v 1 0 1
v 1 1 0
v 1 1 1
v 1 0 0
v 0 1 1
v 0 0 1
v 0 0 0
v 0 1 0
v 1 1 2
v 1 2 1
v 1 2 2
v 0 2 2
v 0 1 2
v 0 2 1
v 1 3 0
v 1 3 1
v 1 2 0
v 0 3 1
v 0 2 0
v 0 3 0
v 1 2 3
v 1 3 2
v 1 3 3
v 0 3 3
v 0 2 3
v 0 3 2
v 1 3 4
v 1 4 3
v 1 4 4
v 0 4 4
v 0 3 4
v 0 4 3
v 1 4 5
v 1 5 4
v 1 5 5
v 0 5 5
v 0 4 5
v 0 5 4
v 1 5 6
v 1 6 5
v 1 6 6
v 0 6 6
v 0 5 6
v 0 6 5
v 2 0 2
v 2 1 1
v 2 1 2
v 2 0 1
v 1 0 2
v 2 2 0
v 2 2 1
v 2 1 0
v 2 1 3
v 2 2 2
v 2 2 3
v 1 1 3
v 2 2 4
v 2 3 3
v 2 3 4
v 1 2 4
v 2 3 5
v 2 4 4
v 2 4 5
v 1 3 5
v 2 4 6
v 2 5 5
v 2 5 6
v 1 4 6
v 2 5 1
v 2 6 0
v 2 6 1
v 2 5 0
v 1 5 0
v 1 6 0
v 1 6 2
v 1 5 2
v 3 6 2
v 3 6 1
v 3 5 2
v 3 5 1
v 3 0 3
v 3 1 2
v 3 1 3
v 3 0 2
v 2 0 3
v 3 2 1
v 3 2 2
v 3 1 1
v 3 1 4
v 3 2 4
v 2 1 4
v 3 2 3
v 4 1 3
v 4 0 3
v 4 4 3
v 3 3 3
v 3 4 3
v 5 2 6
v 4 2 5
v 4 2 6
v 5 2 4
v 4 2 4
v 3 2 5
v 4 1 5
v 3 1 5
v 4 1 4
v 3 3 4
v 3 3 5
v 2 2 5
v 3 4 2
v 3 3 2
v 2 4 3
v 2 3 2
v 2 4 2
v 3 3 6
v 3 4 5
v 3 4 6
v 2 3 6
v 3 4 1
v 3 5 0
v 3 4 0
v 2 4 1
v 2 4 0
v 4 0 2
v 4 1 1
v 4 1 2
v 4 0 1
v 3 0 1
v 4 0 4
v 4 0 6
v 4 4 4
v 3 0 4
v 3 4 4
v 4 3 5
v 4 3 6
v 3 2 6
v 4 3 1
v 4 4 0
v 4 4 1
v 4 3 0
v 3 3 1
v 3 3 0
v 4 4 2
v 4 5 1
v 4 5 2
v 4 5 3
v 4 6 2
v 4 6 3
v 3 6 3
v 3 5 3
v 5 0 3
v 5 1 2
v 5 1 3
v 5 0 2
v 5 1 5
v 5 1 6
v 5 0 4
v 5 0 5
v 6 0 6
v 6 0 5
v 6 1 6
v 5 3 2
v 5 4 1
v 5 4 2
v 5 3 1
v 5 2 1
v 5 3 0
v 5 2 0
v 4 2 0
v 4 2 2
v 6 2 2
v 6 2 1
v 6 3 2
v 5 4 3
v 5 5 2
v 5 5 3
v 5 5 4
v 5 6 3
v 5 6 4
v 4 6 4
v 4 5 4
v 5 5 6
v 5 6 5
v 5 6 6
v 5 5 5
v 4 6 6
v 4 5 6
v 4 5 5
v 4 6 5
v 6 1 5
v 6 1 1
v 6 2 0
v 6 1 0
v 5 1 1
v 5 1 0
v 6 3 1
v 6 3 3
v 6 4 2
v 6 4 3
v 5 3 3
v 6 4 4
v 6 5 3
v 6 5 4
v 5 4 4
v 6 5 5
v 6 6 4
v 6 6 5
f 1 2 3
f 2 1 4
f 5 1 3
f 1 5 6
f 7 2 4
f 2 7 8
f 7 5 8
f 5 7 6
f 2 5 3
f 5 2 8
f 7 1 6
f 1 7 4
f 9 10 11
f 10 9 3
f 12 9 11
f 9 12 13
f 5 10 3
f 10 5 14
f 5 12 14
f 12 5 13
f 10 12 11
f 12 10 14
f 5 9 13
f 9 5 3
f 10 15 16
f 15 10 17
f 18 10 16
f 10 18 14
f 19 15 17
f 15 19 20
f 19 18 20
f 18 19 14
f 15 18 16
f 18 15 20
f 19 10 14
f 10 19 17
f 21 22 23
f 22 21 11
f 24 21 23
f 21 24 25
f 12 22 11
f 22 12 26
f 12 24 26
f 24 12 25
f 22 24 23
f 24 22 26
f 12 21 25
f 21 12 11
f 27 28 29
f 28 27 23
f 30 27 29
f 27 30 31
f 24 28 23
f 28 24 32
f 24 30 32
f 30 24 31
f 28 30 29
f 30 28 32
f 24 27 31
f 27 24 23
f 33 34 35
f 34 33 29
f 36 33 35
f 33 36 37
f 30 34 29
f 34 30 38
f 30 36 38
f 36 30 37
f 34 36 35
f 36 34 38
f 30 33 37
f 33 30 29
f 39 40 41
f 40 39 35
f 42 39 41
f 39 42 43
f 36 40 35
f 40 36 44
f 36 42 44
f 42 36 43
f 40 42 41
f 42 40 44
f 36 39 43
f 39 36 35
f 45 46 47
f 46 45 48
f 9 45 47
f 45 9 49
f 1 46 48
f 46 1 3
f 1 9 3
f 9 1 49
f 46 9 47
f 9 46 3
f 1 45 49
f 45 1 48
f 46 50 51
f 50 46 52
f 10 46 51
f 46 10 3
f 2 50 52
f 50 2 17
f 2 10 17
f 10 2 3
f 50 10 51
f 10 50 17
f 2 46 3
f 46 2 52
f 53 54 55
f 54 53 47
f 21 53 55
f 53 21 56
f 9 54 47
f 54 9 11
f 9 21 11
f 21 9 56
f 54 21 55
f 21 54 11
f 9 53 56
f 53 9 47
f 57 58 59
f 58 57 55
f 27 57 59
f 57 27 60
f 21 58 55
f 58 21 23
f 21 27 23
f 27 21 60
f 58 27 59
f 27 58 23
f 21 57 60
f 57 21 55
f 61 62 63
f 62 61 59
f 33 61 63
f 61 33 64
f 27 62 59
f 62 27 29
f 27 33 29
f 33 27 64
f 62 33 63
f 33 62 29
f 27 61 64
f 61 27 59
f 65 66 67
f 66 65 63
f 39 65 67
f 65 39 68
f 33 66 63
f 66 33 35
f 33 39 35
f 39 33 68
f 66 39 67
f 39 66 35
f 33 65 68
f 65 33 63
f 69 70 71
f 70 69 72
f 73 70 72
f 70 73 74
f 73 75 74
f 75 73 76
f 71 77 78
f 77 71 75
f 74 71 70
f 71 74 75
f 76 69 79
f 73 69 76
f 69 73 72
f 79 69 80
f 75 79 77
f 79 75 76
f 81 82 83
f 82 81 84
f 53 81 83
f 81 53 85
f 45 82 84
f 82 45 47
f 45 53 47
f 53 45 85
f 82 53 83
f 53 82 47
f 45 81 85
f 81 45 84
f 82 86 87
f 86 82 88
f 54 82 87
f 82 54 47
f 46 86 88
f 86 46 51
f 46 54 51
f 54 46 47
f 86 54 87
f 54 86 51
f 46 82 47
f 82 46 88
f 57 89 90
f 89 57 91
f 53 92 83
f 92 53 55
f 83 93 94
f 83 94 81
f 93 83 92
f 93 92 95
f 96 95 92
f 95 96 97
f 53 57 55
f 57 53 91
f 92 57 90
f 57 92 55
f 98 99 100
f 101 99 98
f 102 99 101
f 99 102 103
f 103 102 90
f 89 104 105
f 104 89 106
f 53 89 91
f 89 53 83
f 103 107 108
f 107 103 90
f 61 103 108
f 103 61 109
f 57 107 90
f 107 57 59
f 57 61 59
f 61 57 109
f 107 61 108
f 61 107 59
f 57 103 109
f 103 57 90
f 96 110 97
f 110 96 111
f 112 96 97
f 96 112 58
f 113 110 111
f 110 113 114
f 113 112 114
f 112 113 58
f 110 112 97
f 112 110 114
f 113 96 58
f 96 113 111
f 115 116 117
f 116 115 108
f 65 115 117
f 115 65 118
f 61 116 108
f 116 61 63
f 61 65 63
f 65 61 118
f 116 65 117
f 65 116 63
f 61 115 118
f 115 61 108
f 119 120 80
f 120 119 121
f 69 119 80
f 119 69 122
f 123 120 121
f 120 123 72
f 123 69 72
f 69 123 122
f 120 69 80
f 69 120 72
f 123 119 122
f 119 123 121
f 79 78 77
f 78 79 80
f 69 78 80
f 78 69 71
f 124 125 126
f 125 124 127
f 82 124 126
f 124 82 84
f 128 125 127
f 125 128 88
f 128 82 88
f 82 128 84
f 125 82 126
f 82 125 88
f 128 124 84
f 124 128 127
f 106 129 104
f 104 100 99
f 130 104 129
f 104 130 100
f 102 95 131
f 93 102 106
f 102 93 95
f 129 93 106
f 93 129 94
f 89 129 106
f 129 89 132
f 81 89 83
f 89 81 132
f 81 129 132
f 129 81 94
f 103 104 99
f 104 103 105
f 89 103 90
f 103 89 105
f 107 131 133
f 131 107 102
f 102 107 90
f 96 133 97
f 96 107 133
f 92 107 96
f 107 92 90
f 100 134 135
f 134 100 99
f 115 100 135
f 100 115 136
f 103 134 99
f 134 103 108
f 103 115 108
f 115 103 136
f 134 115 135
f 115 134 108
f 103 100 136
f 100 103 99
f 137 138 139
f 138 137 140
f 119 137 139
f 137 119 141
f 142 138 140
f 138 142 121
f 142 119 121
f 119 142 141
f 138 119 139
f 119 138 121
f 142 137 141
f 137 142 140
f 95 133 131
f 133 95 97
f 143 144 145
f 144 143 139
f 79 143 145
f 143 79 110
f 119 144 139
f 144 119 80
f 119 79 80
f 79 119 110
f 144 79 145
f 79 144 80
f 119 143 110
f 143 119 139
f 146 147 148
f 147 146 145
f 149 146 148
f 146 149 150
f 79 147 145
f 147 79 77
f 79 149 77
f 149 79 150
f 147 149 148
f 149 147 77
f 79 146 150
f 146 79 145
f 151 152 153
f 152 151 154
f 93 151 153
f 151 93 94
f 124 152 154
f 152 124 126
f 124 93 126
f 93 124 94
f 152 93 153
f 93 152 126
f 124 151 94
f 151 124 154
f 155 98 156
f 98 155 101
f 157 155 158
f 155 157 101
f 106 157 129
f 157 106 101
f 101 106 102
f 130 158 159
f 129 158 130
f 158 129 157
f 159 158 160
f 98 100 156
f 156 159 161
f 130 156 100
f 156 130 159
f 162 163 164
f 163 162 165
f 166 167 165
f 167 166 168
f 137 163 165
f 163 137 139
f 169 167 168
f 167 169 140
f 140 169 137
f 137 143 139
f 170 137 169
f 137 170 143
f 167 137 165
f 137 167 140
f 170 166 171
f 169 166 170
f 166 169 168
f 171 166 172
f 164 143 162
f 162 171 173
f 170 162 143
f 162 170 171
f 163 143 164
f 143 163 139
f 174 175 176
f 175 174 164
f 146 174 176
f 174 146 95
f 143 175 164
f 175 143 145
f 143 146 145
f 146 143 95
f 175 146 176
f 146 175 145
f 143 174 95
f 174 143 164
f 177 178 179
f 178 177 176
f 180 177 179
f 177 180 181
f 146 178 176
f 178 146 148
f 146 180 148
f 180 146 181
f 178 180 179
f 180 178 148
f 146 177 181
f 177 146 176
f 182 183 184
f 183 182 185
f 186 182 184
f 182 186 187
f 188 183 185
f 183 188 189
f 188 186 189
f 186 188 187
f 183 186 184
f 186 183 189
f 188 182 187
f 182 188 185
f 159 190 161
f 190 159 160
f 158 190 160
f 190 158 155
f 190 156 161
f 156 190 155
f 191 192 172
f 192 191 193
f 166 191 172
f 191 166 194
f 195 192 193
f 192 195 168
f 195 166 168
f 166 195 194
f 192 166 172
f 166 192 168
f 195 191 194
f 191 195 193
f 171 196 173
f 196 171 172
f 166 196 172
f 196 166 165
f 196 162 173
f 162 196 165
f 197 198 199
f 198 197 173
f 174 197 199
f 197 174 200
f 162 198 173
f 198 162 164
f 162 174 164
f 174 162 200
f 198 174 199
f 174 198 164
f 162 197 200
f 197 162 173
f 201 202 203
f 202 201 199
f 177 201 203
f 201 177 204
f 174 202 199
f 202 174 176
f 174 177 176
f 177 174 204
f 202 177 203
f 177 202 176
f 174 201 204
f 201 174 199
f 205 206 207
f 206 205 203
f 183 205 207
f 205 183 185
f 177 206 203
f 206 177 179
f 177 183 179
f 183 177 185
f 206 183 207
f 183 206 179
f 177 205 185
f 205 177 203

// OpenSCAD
union() {
    translate([0, 0, 0]) cube([1, 1, 1]);
    translate([0, 1, 1]) cube([1, 1, 1]);
    translate([0, 2, 0]) cube([1, 1, 1]);
    translate([0, 2, 2]) cube([1, 1, 1]);
    translate([0, 3, 3]) cube([1, 1, 1]);
    translate([0, 4, 4]) cube([1, 1, 1]);
    translate([0, 5, 5]) cube([1, 1, 1]);
    translate([1, 0, 1]) cube([1, 1, 1]);
    translate([1, 1, 0]) cube([1, 1, 1]);
    translate([1, 1, 2]) cube([1, 1, 1]);
    translate([1, 2, 3]) cube([1, 1, 1]);
    translate([1, 3, 4]) cube([1, 1, 1]);
    translate([1, 4, 5]) cube([1, 1, 1]);
    translate([1, 5, 0]) cube([1, 1, 1]);
    translate([1, 5, 1]) cube([1, 1, 1]);
    translate([2, 0, 2]) cube([1, 1, 1]);
    translate([2, 1, 1]) cube([1, 1, 1]);
    translate([2, 1, 3]) cube([1, 1, 1]);
    translate([2, 2, 4]) cube([1, 1, 1]);
    translate([2, 3, 2]) cube([1, 1, 1]);
    translate([2, 3, 5]) cube([1, 1, 1]);
    translate([2, 4, 0]) cube([1, 1, 1]);
    translate([2, 5, 1]) cube([1, 1, 1]);
    translate([3, 0, 1]) cube([1, 1, 1]);
    translate([3, 0, 3]) cube([1, 1, 1]);
    translate([3, 1, 3]) cube([1, 1, 1]);
    translate([3, 1, 4]) cube([1, 1, 1]);
    translate([3, 2, 3]) cube([1, 1, 1]);
    translate([3, 2, 5]) cube([1, 1, 1]);
    translate([3, 3, 0]) cube([1, 1, 1]);
    translate([3, 3, 3]) cube([1, 1, 1]);
    translate([3, 4, 1]) cube([1, 1, 1]);
    translate([3, 5, 2]) cube([1, 1, 1]);
    translate([4, 0, 2]) cube([1, 1, 1]);
    translate([4, 0, 4]) cube([1, 1, 1]);
    translate([4, 0, 5]) cube([1, 1, 1]);
    translate([4, 1, 4]) cube([1, 1, 1]);
    translate([4, 1, 5]) cube([1, 1, 1]);
    translate([4, 2, 0]) cube([1, 1, 1]);
    translate([4, 2, 1]) cube([1, 1, 1]);
    translate([4, 3, 1]) cube([1, 1, 1]);
    translate([4, 4, 2]) cube([1, 1, 1]);
    translate([4, 5, 3]) cube([1, 1, 1]);
    translate([4, 5, 5]) cube([1, 1, 1]);
    translate([5, 0, 5]) cube([1, 1, 1]);
    translate([5, 1, 0]) cube([1, 1, 1]);
    translate([5, 2, 1]) cube([1, 1, 1]);
    translate([5, 3, 2]) cube([1, 1, 1]);
    translate([5, 4, 3]) cube([1, 1, 1]);
    translate([5, 5, 4]) cube([1, 1, 1]);
}
